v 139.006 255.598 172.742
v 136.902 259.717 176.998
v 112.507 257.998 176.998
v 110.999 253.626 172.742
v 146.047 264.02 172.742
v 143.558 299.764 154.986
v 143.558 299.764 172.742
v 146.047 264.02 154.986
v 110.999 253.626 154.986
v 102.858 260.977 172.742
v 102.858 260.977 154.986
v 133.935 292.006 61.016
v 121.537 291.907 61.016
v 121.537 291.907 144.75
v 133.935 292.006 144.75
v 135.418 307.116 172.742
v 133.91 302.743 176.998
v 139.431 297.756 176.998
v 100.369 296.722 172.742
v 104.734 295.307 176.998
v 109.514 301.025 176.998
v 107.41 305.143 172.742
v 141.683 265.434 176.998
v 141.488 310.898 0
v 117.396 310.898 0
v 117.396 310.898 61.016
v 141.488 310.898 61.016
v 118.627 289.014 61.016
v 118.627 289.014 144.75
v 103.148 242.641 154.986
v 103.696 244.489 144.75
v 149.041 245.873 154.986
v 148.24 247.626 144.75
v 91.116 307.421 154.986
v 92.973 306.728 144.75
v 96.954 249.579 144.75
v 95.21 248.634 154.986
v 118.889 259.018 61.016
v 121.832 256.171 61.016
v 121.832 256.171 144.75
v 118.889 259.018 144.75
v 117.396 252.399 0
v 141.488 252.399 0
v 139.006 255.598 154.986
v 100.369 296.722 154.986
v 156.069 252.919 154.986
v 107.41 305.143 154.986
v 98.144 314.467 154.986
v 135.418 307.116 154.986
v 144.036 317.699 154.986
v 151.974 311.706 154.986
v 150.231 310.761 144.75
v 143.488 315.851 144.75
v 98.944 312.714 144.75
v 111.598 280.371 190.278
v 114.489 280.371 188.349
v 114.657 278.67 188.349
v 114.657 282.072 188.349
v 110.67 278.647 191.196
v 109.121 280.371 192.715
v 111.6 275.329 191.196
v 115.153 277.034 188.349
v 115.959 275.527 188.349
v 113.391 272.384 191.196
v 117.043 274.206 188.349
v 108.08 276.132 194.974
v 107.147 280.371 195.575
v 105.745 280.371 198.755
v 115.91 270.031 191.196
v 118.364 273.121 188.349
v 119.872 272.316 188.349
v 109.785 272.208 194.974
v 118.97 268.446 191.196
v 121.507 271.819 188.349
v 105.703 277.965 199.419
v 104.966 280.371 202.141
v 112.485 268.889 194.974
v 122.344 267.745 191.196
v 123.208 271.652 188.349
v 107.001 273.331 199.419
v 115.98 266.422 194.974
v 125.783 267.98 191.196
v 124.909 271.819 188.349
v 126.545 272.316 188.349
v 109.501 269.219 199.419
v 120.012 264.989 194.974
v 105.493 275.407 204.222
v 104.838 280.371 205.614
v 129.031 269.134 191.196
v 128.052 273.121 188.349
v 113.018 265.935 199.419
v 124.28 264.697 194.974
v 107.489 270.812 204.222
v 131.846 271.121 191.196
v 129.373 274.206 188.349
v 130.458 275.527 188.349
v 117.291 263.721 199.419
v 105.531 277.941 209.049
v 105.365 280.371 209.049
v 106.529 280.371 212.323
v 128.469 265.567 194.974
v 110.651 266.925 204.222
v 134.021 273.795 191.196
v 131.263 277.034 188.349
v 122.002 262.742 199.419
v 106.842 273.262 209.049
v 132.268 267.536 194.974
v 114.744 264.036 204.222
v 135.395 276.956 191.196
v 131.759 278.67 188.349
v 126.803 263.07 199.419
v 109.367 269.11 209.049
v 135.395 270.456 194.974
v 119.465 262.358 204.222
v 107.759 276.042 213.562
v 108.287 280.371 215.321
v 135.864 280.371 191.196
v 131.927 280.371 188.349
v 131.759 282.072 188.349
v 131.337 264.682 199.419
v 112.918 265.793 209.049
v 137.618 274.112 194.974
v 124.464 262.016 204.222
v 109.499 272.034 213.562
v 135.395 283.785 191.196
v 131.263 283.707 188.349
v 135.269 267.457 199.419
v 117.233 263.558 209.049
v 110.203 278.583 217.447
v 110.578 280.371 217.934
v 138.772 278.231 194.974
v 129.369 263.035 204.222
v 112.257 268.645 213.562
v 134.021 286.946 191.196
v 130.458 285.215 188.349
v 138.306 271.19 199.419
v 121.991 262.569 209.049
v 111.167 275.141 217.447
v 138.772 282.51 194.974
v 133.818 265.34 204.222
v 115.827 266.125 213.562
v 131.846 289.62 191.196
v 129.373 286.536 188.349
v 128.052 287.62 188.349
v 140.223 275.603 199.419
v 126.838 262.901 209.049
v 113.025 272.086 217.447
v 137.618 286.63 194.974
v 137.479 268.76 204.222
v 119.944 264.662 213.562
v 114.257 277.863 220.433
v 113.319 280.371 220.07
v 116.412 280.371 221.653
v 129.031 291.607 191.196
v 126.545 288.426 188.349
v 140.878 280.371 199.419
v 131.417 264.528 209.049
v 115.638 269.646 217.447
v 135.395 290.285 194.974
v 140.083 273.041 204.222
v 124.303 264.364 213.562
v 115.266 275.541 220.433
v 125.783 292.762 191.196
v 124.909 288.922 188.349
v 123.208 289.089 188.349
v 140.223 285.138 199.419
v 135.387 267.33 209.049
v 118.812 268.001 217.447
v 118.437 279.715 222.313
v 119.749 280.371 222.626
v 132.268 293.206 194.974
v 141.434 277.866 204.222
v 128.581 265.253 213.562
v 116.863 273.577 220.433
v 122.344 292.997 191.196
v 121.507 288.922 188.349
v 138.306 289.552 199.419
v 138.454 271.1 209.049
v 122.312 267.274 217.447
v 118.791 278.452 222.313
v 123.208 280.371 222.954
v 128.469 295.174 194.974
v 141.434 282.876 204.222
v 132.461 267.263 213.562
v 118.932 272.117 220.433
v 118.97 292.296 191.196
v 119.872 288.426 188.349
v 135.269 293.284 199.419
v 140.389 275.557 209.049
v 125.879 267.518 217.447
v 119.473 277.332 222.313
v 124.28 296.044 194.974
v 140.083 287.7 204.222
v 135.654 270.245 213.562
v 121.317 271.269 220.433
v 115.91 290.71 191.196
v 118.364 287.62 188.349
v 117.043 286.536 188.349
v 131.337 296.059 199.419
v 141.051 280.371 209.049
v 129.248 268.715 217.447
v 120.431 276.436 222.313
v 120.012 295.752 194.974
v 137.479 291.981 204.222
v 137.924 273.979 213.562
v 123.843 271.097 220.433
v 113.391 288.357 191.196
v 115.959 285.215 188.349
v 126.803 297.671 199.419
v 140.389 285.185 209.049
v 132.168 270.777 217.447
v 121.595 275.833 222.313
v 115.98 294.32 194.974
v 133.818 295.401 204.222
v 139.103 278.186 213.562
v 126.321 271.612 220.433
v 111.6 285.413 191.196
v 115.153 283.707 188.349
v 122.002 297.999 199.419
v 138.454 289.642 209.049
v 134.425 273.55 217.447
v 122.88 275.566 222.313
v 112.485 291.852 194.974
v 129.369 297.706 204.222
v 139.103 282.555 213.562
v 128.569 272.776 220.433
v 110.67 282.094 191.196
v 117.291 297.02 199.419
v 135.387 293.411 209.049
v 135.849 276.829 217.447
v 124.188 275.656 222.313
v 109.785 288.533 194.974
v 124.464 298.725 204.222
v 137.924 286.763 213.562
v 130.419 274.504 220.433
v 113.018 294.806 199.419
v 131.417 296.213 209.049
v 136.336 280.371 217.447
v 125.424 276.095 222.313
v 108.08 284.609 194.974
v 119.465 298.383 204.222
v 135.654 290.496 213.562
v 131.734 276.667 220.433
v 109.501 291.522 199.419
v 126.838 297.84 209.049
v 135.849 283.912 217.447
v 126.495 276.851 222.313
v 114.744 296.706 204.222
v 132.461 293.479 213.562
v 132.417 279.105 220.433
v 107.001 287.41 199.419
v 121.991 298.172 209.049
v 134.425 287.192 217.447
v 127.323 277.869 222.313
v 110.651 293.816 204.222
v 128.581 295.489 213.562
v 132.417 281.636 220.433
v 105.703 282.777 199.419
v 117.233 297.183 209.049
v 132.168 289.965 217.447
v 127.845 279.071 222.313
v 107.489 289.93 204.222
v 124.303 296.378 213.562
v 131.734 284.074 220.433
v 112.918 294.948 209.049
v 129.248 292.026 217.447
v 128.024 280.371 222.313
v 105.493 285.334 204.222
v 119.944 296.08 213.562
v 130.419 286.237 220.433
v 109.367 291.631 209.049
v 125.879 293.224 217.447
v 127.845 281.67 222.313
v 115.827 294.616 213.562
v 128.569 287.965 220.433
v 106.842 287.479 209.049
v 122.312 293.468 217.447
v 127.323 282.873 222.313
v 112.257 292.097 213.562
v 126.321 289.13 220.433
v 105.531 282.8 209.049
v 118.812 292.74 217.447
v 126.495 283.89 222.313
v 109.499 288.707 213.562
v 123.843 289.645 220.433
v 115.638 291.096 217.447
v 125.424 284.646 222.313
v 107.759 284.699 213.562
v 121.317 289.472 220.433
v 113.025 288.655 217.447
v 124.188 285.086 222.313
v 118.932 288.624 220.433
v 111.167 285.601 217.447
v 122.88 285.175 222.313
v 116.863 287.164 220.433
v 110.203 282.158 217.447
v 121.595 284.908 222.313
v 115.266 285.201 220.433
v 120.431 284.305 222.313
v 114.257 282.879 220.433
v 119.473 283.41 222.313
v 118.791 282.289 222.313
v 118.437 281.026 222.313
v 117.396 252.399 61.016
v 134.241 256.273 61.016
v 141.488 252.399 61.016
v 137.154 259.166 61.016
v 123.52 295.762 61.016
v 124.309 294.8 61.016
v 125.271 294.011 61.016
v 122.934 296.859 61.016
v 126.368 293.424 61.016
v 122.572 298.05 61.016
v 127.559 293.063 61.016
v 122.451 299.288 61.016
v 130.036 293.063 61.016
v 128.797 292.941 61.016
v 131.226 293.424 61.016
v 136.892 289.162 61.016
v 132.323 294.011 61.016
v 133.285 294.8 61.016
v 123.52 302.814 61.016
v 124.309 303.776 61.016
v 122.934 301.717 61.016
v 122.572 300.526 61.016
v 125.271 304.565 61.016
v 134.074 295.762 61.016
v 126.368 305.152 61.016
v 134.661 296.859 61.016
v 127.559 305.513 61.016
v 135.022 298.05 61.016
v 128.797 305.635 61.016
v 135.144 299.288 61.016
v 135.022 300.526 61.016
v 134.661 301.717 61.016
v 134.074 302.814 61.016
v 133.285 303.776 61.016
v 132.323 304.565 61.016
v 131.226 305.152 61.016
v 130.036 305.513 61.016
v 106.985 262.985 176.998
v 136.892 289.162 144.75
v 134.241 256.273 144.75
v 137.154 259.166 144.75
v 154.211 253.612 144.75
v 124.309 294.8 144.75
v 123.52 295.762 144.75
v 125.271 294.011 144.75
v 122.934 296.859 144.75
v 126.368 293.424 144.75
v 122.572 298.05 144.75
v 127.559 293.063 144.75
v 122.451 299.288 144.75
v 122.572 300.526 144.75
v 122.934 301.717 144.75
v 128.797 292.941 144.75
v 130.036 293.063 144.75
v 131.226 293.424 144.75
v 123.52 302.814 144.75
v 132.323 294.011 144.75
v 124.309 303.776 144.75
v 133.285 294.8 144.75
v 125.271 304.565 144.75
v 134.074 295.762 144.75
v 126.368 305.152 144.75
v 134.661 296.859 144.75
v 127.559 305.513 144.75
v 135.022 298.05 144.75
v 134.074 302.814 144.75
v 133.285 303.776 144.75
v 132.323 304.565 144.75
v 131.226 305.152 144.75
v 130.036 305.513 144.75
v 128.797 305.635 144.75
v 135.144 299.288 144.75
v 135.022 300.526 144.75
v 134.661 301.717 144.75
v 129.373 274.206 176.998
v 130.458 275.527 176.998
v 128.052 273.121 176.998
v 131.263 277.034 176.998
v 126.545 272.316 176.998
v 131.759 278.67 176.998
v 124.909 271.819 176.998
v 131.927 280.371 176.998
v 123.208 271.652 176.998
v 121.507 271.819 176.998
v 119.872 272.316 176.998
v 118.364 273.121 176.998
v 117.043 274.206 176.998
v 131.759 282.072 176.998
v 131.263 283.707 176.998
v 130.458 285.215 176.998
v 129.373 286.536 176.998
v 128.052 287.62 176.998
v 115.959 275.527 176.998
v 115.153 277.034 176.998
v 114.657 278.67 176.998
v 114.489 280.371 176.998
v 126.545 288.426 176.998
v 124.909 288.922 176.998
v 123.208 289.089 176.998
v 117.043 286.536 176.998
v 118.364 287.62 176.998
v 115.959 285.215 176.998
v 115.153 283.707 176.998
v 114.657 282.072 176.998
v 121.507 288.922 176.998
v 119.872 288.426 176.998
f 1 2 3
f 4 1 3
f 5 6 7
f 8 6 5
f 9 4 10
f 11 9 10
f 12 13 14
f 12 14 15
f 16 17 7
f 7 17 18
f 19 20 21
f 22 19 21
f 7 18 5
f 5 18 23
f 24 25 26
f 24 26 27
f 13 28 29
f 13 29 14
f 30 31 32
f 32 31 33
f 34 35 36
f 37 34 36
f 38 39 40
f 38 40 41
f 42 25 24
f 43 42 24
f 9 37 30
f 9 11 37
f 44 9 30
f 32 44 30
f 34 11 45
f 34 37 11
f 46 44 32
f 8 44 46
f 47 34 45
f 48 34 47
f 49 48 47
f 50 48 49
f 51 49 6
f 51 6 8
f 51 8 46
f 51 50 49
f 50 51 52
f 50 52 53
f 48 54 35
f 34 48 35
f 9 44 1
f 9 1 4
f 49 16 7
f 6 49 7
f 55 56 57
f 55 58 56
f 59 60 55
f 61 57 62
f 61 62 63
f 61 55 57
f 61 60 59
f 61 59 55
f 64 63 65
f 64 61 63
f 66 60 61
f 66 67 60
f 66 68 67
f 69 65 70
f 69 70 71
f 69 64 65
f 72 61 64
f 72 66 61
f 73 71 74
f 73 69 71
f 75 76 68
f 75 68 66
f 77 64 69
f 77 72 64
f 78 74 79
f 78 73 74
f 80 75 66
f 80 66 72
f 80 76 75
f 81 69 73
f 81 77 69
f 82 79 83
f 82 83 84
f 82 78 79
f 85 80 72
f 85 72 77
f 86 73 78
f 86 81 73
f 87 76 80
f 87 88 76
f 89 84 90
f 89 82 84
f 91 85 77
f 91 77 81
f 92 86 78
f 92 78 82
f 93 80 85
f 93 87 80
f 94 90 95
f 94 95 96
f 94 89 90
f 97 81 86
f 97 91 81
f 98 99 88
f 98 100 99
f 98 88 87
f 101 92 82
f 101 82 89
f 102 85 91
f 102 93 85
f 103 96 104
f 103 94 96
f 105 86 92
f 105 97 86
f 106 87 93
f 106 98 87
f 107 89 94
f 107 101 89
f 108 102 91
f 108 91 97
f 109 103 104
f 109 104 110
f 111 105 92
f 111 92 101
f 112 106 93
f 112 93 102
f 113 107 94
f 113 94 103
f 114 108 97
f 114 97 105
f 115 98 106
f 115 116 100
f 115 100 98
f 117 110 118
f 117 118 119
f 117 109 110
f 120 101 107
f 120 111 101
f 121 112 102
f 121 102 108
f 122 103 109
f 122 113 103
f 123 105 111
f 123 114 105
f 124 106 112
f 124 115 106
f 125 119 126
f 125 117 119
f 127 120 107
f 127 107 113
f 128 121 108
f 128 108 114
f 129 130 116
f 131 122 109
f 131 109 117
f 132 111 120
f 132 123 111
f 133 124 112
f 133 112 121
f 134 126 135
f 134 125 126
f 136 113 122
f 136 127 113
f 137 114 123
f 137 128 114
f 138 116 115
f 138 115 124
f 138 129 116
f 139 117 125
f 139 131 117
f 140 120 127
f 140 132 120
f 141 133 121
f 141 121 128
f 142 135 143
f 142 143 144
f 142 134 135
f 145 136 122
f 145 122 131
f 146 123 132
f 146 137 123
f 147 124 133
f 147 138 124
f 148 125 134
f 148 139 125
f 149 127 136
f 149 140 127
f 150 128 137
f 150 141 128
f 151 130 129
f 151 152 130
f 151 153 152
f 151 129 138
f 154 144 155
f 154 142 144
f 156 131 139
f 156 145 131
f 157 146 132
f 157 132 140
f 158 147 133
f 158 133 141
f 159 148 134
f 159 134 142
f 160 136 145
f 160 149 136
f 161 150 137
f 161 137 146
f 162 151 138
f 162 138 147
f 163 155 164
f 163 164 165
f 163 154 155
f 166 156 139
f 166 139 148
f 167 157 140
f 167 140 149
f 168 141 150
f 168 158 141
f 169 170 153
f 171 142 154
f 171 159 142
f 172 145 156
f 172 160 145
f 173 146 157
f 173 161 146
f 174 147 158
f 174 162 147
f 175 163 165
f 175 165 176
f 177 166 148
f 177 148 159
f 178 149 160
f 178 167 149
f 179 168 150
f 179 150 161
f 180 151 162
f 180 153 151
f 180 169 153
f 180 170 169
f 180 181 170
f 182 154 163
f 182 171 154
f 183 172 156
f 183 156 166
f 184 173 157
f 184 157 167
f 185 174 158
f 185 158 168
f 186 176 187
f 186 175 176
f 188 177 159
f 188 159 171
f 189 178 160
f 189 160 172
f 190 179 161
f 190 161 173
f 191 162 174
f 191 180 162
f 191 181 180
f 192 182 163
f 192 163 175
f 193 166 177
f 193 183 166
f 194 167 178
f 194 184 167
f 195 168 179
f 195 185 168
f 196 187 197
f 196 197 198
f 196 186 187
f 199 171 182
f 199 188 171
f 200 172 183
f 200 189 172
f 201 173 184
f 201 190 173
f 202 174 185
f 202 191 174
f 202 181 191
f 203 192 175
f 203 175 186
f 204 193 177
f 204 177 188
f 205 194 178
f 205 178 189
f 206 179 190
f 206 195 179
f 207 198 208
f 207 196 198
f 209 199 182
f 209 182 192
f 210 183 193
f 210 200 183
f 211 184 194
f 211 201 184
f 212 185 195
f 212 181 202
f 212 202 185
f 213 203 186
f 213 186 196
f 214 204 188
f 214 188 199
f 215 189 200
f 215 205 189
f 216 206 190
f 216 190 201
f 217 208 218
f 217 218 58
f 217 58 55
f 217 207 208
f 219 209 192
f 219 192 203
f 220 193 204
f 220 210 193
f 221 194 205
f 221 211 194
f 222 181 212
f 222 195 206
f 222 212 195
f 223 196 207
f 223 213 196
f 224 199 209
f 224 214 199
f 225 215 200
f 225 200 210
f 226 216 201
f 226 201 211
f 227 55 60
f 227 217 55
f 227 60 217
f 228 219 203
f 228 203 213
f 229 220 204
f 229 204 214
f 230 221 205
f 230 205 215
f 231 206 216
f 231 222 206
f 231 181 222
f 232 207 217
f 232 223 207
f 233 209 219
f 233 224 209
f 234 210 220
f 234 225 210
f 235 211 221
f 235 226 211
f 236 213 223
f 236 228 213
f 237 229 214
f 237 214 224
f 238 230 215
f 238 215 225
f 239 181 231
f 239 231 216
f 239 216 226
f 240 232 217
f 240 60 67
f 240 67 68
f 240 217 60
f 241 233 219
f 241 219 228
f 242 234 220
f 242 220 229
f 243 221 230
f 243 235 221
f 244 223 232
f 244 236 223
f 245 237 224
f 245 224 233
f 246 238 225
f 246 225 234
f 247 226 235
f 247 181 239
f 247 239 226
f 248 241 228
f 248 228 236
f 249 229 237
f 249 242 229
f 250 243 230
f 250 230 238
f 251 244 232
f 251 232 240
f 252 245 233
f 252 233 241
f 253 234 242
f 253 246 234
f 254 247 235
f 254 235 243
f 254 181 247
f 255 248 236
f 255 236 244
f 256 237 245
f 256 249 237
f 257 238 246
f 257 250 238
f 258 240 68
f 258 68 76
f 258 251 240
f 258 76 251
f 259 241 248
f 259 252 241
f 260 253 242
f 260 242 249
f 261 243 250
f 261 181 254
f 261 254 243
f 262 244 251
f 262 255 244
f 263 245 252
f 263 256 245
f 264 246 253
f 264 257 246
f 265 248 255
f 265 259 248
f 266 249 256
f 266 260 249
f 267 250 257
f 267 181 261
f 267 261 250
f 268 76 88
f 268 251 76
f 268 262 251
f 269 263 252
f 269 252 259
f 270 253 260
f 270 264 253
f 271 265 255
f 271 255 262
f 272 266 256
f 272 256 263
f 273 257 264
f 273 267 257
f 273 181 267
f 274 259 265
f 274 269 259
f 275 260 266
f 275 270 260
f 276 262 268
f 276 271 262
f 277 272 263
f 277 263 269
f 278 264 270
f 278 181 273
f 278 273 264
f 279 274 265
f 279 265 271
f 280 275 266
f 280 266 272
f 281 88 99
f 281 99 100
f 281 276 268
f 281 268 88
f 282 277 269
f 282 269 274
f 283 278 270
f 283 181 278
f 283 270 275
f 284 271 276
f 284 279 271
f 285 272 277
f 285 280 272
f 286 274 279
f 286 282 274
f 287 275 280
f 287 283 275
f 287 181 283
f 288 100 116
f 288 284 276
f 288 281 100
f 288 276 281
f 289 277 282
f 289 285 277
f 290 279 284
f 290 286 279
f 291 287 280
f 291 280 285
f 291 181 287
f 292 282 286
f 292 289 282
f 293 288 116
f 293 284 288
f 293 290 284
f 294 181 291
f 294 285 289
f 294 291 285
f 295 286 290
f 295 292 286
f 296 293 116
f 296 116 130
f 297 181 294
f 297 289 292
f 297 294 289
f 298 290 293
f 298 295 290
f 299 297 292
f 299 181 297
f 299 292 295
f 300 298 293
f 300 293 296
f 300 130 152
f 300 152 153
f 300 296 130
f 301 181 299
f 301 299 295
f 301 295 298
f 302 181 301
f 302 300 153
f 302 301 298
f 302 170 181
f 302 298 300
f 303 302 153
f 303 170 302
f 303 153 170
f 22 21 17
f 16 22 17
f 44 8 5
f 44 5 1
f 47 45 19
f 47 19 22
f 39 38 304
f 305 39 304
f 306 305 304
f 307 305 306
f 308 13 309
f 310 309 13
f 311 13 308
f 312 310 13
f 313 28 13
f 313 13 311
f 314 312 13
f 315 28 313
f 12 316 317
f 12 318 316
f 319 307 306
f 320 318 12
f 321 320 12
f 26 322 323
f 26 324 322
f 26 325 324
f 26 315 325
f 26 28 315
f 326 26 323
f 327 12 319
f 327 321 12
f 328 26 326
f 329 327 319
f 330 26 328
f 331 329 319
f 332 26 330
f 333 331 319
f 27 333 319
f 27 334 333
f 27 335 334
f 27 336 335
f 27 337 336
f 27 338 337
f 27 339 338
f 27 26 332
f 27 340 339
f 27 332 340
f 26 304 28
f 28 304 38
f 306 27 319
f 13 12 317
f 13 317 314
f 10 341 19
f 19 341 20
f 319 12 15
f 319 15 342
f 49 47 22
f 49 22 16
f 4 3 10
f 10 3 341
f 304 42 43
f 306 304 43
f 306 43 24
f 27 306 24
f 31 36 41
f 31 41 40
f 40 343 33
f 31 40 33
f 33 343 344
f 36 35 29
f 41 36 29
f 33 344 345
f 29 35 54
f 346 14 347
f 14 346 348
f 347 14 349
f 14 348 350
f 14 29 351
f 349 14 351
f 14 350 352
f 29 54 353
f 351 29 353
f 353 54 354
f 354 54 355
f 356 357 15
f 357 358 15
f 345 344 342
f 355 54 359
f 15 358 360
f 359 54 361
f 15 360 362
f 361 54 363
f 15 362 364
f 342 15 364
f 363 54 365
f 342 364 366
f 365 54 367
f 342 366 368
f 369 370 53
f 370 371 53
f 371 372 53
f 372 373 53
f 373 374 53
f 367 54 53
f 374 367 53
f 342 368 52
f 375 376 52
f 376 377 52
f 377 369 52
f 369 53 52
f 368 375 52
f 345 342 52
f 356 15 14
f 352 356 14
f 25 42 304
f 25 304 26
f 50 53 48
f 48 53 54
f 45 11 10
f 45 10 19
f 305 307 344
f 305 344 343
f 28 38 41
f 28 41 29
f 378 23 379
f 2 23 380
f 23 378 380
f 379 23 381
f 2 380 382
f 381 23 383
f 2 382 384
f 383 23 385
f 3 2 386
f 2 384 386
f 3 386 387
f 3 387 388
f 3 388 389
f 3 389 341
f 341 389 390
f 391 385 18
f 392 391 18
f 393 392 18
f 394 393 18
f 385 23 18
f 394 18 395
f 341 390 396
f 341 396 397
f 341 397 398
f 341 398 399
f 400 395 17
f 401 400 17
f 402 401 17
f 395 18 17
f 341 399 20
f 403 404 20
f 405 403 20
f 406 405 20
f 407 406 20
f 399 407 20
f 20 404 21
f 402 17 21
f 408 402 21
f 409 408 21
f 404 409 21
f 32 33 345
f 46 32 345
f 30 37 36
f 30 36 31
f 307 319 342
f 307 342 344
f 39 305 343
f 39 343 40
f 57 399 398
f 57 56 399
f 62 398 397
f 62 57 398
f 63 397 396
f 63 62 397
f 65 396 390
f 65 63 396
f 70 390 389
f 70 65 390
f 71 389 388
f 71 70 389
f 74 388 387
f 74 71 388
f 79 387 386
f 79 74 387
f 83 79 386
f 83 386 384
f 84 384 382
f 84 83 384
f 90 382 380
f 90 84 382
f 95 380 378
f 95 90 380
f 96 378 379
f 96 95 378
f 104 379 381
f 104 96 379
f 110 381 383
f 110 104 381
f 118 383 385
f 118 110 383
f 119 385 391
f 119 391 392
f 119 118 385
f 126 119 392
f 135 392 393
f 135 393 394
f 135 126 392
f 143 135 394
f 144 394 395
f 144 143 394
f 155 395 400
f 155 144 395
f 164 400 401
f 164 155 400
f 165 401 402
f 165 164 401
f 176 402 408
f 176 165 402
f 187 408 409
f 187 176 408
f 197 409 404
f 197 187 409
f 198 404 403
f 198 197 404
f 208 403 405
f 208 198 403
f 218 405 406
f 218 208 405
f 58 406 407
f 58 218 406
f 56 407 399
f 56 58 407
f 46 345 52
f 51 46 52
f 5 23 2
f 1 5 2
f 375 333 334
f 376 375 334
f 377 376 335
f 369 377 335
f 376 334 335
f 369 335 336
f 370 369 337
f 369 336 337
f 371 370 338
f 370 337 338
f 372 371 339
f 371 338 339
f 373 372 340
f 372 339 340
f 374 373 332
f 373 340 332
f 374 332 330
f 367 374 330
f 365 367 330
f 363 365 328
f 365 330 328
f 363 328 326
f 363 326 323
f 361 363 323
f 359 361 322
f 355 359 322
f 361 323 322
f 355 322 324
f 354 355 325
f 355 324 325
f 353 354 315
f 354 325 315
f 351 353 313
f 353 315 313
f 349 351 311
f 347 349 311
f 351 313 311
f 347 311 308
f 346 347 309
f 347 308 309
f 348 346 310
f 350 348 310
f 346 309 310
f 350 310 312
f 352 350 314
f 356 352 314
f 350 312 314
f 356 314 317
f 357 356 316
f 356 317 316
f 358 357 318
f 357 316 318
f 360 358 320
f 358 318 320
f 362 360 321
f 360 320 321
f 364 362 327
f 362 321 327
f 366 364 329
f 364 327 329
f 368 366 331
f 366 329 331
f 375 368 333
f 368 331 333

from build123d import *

# Parameters (mm, degrees)
SKETCH1_W           = 24.092408
SKETCH1_H           = 58.498994
BOSS_EXTRUDE1_DEPTH = 61.016388
SKETCH2_R           = 6.346800124
BOSS_EXTRUDE2_DEPTH = 83.73364
BOSS_EXTRUDE3_DEPTH = 10.235946
BOSS_EXTRUDE3_DRAFT = -10
BOSS_EXTRUDE4_DEPTH = 22.011894
CHAMFER1_SIZE       = 4.256024


with BuildPart() as part:
    # Sketch1 → Boss-Extrude1 (new body)
    with BuildSketch(Plane.XY):
        with Locations((129.44221, 281.648027)):
            Rectangle(SKETCH1_W, SKETCH1_H)
    extrude(amount=BOSS_EXTRUDE1_DEPTH)

    # Sketch2 → Boss-Extrude2 (add)
    with BuildSketch(Plane.XY.offset(61.016388)):
        with Locations((128.797304, 299.288048124)):
            Circle(SKETCH2_R)
        Polygon((118.62689, 289.014154), (121.536714, 291.906706), (133.935216, 292.005766), (136.89203, 289.161982), (137.15365, 259.165852), (134.240778, 256.272792), (121.831608, 256.171192), (118.88851, 259.018278), align=None)
    extrude(amount=BOSS_EXTRUDE2_DEPTH)


with BuildPart() as boss_extrude3_tool:
    # Sketch3 → Boss-Extrude3 (with draft: the straight prism first)
    with BuildSketch(Plane.XY.offset(144.750028)):
        Polygon((92.973398, 306.72786), (96.953832, 249.578876), (103.696262, 244.488716), (148.240242, 247.626124), (154.211274, 253.612142), (150.230586, 310.760872), (143.488156, 315.851286), (98.94443, 312.713624), align=None)
    extrude(amount=BOSS_EXTRUDE3_DEPTH)
    # Boss-Extrude3: the draft: its side faces are tilted about the plane it starts from
    boss_extrude3_sides = [boss_extrude3_tool.faces().sort_by_distance(p)[0] for p in [
        (94.963615, 278.153368, 149.868001),
        (100.325047, 247.033796, 149.868001),
        (125.968252, 246.05742, 149.868001),
        (151.225758, 250.619133, 149.868001),
        (152.22093, 282.186507, 149.868001),
        (146.859371, 313.306079, 149.868001),
        (121.216293, 314.282455, 149.868001),
        (95.958914, 309.720742, 149.868001),
    ]]
    draft(boss_extrude3_sides, Plane.XY.offset(144.750028), BOSS_EXTRUDE3_DRAFT)


with BuildPart() as part_1:
    add(part.part)

    # Boss-Extrude3: add boss_extrude3_tool
    add(boss_extrude3_tool.part)

    # Sketch4 → Boss-Extrude4 (add)
    with BuildSketch(Plane.XY.offset(154.985974)):
        Polygon((100.368862, 296.721784), (107.41025, 305.1429), (135.417814, 307.115718), (143.557752, 299.763942), (146.04746, 264.019538), (139.006072, 255.598422), (110.998508, 253.625604), (102.858316, 260.97738), align=None)
    extrude(amount=BOSS_EXTRUDE4_DEPTH)

    # Chamfer1
    chamfer1_edges = [part_1.edges().sort_by_distance(p)[0] for p in [
        (101.613589, 278.849582, 176.997868),
        (106.928412, 257.301492, 176.997868),
        (125.00229, 254.612013, 176.997868),
        (142.526766, 259.80898, 176.997868),
        (144.802606, 281.89174, 176.997868),
        (139.487783, 303.43983, 176.997868),
        (121.414032, 306.129309, 176.997868),
        (103.889556, 300.932342, 176.997868),
    ]]
    chamfer(chamfer1_edges, length=CHAMFER1_SIZE)

    # Sketch6 → Revolve1 (revolve)
    with BuildSketch(Plane(origin=(123.208151271, 0, 0), x_dir=(0, 0, -1), z_dir=(1, 0, 0)), mode=Mode.PRIVATE) as revolve1_sk:
        with BuildLine():
            Line((-176.997868, 280.370660315), (-176.997868, 289.089464315))
            Line((-176.997868, 289.089464315), (-188.349382, 289.089464315))
            ThreePointArc((-188.349382, 289.089464315), (-209.048874501, 298.213625605), (-222.953834, 280.370660315))
            Line((-222.953834, 280.370660315), (-176.997868, 280.370660315))
        make_face()
    revolve(revolve1_sk.sketch.rotate(Axis((123.208151271, 280.370660315, 176.997868), (0, 0, 1)), 90), axis=Axis((123.208151271, 280.370660315, 176.997868), (0, 0, 1)))


solid = part_1.part
